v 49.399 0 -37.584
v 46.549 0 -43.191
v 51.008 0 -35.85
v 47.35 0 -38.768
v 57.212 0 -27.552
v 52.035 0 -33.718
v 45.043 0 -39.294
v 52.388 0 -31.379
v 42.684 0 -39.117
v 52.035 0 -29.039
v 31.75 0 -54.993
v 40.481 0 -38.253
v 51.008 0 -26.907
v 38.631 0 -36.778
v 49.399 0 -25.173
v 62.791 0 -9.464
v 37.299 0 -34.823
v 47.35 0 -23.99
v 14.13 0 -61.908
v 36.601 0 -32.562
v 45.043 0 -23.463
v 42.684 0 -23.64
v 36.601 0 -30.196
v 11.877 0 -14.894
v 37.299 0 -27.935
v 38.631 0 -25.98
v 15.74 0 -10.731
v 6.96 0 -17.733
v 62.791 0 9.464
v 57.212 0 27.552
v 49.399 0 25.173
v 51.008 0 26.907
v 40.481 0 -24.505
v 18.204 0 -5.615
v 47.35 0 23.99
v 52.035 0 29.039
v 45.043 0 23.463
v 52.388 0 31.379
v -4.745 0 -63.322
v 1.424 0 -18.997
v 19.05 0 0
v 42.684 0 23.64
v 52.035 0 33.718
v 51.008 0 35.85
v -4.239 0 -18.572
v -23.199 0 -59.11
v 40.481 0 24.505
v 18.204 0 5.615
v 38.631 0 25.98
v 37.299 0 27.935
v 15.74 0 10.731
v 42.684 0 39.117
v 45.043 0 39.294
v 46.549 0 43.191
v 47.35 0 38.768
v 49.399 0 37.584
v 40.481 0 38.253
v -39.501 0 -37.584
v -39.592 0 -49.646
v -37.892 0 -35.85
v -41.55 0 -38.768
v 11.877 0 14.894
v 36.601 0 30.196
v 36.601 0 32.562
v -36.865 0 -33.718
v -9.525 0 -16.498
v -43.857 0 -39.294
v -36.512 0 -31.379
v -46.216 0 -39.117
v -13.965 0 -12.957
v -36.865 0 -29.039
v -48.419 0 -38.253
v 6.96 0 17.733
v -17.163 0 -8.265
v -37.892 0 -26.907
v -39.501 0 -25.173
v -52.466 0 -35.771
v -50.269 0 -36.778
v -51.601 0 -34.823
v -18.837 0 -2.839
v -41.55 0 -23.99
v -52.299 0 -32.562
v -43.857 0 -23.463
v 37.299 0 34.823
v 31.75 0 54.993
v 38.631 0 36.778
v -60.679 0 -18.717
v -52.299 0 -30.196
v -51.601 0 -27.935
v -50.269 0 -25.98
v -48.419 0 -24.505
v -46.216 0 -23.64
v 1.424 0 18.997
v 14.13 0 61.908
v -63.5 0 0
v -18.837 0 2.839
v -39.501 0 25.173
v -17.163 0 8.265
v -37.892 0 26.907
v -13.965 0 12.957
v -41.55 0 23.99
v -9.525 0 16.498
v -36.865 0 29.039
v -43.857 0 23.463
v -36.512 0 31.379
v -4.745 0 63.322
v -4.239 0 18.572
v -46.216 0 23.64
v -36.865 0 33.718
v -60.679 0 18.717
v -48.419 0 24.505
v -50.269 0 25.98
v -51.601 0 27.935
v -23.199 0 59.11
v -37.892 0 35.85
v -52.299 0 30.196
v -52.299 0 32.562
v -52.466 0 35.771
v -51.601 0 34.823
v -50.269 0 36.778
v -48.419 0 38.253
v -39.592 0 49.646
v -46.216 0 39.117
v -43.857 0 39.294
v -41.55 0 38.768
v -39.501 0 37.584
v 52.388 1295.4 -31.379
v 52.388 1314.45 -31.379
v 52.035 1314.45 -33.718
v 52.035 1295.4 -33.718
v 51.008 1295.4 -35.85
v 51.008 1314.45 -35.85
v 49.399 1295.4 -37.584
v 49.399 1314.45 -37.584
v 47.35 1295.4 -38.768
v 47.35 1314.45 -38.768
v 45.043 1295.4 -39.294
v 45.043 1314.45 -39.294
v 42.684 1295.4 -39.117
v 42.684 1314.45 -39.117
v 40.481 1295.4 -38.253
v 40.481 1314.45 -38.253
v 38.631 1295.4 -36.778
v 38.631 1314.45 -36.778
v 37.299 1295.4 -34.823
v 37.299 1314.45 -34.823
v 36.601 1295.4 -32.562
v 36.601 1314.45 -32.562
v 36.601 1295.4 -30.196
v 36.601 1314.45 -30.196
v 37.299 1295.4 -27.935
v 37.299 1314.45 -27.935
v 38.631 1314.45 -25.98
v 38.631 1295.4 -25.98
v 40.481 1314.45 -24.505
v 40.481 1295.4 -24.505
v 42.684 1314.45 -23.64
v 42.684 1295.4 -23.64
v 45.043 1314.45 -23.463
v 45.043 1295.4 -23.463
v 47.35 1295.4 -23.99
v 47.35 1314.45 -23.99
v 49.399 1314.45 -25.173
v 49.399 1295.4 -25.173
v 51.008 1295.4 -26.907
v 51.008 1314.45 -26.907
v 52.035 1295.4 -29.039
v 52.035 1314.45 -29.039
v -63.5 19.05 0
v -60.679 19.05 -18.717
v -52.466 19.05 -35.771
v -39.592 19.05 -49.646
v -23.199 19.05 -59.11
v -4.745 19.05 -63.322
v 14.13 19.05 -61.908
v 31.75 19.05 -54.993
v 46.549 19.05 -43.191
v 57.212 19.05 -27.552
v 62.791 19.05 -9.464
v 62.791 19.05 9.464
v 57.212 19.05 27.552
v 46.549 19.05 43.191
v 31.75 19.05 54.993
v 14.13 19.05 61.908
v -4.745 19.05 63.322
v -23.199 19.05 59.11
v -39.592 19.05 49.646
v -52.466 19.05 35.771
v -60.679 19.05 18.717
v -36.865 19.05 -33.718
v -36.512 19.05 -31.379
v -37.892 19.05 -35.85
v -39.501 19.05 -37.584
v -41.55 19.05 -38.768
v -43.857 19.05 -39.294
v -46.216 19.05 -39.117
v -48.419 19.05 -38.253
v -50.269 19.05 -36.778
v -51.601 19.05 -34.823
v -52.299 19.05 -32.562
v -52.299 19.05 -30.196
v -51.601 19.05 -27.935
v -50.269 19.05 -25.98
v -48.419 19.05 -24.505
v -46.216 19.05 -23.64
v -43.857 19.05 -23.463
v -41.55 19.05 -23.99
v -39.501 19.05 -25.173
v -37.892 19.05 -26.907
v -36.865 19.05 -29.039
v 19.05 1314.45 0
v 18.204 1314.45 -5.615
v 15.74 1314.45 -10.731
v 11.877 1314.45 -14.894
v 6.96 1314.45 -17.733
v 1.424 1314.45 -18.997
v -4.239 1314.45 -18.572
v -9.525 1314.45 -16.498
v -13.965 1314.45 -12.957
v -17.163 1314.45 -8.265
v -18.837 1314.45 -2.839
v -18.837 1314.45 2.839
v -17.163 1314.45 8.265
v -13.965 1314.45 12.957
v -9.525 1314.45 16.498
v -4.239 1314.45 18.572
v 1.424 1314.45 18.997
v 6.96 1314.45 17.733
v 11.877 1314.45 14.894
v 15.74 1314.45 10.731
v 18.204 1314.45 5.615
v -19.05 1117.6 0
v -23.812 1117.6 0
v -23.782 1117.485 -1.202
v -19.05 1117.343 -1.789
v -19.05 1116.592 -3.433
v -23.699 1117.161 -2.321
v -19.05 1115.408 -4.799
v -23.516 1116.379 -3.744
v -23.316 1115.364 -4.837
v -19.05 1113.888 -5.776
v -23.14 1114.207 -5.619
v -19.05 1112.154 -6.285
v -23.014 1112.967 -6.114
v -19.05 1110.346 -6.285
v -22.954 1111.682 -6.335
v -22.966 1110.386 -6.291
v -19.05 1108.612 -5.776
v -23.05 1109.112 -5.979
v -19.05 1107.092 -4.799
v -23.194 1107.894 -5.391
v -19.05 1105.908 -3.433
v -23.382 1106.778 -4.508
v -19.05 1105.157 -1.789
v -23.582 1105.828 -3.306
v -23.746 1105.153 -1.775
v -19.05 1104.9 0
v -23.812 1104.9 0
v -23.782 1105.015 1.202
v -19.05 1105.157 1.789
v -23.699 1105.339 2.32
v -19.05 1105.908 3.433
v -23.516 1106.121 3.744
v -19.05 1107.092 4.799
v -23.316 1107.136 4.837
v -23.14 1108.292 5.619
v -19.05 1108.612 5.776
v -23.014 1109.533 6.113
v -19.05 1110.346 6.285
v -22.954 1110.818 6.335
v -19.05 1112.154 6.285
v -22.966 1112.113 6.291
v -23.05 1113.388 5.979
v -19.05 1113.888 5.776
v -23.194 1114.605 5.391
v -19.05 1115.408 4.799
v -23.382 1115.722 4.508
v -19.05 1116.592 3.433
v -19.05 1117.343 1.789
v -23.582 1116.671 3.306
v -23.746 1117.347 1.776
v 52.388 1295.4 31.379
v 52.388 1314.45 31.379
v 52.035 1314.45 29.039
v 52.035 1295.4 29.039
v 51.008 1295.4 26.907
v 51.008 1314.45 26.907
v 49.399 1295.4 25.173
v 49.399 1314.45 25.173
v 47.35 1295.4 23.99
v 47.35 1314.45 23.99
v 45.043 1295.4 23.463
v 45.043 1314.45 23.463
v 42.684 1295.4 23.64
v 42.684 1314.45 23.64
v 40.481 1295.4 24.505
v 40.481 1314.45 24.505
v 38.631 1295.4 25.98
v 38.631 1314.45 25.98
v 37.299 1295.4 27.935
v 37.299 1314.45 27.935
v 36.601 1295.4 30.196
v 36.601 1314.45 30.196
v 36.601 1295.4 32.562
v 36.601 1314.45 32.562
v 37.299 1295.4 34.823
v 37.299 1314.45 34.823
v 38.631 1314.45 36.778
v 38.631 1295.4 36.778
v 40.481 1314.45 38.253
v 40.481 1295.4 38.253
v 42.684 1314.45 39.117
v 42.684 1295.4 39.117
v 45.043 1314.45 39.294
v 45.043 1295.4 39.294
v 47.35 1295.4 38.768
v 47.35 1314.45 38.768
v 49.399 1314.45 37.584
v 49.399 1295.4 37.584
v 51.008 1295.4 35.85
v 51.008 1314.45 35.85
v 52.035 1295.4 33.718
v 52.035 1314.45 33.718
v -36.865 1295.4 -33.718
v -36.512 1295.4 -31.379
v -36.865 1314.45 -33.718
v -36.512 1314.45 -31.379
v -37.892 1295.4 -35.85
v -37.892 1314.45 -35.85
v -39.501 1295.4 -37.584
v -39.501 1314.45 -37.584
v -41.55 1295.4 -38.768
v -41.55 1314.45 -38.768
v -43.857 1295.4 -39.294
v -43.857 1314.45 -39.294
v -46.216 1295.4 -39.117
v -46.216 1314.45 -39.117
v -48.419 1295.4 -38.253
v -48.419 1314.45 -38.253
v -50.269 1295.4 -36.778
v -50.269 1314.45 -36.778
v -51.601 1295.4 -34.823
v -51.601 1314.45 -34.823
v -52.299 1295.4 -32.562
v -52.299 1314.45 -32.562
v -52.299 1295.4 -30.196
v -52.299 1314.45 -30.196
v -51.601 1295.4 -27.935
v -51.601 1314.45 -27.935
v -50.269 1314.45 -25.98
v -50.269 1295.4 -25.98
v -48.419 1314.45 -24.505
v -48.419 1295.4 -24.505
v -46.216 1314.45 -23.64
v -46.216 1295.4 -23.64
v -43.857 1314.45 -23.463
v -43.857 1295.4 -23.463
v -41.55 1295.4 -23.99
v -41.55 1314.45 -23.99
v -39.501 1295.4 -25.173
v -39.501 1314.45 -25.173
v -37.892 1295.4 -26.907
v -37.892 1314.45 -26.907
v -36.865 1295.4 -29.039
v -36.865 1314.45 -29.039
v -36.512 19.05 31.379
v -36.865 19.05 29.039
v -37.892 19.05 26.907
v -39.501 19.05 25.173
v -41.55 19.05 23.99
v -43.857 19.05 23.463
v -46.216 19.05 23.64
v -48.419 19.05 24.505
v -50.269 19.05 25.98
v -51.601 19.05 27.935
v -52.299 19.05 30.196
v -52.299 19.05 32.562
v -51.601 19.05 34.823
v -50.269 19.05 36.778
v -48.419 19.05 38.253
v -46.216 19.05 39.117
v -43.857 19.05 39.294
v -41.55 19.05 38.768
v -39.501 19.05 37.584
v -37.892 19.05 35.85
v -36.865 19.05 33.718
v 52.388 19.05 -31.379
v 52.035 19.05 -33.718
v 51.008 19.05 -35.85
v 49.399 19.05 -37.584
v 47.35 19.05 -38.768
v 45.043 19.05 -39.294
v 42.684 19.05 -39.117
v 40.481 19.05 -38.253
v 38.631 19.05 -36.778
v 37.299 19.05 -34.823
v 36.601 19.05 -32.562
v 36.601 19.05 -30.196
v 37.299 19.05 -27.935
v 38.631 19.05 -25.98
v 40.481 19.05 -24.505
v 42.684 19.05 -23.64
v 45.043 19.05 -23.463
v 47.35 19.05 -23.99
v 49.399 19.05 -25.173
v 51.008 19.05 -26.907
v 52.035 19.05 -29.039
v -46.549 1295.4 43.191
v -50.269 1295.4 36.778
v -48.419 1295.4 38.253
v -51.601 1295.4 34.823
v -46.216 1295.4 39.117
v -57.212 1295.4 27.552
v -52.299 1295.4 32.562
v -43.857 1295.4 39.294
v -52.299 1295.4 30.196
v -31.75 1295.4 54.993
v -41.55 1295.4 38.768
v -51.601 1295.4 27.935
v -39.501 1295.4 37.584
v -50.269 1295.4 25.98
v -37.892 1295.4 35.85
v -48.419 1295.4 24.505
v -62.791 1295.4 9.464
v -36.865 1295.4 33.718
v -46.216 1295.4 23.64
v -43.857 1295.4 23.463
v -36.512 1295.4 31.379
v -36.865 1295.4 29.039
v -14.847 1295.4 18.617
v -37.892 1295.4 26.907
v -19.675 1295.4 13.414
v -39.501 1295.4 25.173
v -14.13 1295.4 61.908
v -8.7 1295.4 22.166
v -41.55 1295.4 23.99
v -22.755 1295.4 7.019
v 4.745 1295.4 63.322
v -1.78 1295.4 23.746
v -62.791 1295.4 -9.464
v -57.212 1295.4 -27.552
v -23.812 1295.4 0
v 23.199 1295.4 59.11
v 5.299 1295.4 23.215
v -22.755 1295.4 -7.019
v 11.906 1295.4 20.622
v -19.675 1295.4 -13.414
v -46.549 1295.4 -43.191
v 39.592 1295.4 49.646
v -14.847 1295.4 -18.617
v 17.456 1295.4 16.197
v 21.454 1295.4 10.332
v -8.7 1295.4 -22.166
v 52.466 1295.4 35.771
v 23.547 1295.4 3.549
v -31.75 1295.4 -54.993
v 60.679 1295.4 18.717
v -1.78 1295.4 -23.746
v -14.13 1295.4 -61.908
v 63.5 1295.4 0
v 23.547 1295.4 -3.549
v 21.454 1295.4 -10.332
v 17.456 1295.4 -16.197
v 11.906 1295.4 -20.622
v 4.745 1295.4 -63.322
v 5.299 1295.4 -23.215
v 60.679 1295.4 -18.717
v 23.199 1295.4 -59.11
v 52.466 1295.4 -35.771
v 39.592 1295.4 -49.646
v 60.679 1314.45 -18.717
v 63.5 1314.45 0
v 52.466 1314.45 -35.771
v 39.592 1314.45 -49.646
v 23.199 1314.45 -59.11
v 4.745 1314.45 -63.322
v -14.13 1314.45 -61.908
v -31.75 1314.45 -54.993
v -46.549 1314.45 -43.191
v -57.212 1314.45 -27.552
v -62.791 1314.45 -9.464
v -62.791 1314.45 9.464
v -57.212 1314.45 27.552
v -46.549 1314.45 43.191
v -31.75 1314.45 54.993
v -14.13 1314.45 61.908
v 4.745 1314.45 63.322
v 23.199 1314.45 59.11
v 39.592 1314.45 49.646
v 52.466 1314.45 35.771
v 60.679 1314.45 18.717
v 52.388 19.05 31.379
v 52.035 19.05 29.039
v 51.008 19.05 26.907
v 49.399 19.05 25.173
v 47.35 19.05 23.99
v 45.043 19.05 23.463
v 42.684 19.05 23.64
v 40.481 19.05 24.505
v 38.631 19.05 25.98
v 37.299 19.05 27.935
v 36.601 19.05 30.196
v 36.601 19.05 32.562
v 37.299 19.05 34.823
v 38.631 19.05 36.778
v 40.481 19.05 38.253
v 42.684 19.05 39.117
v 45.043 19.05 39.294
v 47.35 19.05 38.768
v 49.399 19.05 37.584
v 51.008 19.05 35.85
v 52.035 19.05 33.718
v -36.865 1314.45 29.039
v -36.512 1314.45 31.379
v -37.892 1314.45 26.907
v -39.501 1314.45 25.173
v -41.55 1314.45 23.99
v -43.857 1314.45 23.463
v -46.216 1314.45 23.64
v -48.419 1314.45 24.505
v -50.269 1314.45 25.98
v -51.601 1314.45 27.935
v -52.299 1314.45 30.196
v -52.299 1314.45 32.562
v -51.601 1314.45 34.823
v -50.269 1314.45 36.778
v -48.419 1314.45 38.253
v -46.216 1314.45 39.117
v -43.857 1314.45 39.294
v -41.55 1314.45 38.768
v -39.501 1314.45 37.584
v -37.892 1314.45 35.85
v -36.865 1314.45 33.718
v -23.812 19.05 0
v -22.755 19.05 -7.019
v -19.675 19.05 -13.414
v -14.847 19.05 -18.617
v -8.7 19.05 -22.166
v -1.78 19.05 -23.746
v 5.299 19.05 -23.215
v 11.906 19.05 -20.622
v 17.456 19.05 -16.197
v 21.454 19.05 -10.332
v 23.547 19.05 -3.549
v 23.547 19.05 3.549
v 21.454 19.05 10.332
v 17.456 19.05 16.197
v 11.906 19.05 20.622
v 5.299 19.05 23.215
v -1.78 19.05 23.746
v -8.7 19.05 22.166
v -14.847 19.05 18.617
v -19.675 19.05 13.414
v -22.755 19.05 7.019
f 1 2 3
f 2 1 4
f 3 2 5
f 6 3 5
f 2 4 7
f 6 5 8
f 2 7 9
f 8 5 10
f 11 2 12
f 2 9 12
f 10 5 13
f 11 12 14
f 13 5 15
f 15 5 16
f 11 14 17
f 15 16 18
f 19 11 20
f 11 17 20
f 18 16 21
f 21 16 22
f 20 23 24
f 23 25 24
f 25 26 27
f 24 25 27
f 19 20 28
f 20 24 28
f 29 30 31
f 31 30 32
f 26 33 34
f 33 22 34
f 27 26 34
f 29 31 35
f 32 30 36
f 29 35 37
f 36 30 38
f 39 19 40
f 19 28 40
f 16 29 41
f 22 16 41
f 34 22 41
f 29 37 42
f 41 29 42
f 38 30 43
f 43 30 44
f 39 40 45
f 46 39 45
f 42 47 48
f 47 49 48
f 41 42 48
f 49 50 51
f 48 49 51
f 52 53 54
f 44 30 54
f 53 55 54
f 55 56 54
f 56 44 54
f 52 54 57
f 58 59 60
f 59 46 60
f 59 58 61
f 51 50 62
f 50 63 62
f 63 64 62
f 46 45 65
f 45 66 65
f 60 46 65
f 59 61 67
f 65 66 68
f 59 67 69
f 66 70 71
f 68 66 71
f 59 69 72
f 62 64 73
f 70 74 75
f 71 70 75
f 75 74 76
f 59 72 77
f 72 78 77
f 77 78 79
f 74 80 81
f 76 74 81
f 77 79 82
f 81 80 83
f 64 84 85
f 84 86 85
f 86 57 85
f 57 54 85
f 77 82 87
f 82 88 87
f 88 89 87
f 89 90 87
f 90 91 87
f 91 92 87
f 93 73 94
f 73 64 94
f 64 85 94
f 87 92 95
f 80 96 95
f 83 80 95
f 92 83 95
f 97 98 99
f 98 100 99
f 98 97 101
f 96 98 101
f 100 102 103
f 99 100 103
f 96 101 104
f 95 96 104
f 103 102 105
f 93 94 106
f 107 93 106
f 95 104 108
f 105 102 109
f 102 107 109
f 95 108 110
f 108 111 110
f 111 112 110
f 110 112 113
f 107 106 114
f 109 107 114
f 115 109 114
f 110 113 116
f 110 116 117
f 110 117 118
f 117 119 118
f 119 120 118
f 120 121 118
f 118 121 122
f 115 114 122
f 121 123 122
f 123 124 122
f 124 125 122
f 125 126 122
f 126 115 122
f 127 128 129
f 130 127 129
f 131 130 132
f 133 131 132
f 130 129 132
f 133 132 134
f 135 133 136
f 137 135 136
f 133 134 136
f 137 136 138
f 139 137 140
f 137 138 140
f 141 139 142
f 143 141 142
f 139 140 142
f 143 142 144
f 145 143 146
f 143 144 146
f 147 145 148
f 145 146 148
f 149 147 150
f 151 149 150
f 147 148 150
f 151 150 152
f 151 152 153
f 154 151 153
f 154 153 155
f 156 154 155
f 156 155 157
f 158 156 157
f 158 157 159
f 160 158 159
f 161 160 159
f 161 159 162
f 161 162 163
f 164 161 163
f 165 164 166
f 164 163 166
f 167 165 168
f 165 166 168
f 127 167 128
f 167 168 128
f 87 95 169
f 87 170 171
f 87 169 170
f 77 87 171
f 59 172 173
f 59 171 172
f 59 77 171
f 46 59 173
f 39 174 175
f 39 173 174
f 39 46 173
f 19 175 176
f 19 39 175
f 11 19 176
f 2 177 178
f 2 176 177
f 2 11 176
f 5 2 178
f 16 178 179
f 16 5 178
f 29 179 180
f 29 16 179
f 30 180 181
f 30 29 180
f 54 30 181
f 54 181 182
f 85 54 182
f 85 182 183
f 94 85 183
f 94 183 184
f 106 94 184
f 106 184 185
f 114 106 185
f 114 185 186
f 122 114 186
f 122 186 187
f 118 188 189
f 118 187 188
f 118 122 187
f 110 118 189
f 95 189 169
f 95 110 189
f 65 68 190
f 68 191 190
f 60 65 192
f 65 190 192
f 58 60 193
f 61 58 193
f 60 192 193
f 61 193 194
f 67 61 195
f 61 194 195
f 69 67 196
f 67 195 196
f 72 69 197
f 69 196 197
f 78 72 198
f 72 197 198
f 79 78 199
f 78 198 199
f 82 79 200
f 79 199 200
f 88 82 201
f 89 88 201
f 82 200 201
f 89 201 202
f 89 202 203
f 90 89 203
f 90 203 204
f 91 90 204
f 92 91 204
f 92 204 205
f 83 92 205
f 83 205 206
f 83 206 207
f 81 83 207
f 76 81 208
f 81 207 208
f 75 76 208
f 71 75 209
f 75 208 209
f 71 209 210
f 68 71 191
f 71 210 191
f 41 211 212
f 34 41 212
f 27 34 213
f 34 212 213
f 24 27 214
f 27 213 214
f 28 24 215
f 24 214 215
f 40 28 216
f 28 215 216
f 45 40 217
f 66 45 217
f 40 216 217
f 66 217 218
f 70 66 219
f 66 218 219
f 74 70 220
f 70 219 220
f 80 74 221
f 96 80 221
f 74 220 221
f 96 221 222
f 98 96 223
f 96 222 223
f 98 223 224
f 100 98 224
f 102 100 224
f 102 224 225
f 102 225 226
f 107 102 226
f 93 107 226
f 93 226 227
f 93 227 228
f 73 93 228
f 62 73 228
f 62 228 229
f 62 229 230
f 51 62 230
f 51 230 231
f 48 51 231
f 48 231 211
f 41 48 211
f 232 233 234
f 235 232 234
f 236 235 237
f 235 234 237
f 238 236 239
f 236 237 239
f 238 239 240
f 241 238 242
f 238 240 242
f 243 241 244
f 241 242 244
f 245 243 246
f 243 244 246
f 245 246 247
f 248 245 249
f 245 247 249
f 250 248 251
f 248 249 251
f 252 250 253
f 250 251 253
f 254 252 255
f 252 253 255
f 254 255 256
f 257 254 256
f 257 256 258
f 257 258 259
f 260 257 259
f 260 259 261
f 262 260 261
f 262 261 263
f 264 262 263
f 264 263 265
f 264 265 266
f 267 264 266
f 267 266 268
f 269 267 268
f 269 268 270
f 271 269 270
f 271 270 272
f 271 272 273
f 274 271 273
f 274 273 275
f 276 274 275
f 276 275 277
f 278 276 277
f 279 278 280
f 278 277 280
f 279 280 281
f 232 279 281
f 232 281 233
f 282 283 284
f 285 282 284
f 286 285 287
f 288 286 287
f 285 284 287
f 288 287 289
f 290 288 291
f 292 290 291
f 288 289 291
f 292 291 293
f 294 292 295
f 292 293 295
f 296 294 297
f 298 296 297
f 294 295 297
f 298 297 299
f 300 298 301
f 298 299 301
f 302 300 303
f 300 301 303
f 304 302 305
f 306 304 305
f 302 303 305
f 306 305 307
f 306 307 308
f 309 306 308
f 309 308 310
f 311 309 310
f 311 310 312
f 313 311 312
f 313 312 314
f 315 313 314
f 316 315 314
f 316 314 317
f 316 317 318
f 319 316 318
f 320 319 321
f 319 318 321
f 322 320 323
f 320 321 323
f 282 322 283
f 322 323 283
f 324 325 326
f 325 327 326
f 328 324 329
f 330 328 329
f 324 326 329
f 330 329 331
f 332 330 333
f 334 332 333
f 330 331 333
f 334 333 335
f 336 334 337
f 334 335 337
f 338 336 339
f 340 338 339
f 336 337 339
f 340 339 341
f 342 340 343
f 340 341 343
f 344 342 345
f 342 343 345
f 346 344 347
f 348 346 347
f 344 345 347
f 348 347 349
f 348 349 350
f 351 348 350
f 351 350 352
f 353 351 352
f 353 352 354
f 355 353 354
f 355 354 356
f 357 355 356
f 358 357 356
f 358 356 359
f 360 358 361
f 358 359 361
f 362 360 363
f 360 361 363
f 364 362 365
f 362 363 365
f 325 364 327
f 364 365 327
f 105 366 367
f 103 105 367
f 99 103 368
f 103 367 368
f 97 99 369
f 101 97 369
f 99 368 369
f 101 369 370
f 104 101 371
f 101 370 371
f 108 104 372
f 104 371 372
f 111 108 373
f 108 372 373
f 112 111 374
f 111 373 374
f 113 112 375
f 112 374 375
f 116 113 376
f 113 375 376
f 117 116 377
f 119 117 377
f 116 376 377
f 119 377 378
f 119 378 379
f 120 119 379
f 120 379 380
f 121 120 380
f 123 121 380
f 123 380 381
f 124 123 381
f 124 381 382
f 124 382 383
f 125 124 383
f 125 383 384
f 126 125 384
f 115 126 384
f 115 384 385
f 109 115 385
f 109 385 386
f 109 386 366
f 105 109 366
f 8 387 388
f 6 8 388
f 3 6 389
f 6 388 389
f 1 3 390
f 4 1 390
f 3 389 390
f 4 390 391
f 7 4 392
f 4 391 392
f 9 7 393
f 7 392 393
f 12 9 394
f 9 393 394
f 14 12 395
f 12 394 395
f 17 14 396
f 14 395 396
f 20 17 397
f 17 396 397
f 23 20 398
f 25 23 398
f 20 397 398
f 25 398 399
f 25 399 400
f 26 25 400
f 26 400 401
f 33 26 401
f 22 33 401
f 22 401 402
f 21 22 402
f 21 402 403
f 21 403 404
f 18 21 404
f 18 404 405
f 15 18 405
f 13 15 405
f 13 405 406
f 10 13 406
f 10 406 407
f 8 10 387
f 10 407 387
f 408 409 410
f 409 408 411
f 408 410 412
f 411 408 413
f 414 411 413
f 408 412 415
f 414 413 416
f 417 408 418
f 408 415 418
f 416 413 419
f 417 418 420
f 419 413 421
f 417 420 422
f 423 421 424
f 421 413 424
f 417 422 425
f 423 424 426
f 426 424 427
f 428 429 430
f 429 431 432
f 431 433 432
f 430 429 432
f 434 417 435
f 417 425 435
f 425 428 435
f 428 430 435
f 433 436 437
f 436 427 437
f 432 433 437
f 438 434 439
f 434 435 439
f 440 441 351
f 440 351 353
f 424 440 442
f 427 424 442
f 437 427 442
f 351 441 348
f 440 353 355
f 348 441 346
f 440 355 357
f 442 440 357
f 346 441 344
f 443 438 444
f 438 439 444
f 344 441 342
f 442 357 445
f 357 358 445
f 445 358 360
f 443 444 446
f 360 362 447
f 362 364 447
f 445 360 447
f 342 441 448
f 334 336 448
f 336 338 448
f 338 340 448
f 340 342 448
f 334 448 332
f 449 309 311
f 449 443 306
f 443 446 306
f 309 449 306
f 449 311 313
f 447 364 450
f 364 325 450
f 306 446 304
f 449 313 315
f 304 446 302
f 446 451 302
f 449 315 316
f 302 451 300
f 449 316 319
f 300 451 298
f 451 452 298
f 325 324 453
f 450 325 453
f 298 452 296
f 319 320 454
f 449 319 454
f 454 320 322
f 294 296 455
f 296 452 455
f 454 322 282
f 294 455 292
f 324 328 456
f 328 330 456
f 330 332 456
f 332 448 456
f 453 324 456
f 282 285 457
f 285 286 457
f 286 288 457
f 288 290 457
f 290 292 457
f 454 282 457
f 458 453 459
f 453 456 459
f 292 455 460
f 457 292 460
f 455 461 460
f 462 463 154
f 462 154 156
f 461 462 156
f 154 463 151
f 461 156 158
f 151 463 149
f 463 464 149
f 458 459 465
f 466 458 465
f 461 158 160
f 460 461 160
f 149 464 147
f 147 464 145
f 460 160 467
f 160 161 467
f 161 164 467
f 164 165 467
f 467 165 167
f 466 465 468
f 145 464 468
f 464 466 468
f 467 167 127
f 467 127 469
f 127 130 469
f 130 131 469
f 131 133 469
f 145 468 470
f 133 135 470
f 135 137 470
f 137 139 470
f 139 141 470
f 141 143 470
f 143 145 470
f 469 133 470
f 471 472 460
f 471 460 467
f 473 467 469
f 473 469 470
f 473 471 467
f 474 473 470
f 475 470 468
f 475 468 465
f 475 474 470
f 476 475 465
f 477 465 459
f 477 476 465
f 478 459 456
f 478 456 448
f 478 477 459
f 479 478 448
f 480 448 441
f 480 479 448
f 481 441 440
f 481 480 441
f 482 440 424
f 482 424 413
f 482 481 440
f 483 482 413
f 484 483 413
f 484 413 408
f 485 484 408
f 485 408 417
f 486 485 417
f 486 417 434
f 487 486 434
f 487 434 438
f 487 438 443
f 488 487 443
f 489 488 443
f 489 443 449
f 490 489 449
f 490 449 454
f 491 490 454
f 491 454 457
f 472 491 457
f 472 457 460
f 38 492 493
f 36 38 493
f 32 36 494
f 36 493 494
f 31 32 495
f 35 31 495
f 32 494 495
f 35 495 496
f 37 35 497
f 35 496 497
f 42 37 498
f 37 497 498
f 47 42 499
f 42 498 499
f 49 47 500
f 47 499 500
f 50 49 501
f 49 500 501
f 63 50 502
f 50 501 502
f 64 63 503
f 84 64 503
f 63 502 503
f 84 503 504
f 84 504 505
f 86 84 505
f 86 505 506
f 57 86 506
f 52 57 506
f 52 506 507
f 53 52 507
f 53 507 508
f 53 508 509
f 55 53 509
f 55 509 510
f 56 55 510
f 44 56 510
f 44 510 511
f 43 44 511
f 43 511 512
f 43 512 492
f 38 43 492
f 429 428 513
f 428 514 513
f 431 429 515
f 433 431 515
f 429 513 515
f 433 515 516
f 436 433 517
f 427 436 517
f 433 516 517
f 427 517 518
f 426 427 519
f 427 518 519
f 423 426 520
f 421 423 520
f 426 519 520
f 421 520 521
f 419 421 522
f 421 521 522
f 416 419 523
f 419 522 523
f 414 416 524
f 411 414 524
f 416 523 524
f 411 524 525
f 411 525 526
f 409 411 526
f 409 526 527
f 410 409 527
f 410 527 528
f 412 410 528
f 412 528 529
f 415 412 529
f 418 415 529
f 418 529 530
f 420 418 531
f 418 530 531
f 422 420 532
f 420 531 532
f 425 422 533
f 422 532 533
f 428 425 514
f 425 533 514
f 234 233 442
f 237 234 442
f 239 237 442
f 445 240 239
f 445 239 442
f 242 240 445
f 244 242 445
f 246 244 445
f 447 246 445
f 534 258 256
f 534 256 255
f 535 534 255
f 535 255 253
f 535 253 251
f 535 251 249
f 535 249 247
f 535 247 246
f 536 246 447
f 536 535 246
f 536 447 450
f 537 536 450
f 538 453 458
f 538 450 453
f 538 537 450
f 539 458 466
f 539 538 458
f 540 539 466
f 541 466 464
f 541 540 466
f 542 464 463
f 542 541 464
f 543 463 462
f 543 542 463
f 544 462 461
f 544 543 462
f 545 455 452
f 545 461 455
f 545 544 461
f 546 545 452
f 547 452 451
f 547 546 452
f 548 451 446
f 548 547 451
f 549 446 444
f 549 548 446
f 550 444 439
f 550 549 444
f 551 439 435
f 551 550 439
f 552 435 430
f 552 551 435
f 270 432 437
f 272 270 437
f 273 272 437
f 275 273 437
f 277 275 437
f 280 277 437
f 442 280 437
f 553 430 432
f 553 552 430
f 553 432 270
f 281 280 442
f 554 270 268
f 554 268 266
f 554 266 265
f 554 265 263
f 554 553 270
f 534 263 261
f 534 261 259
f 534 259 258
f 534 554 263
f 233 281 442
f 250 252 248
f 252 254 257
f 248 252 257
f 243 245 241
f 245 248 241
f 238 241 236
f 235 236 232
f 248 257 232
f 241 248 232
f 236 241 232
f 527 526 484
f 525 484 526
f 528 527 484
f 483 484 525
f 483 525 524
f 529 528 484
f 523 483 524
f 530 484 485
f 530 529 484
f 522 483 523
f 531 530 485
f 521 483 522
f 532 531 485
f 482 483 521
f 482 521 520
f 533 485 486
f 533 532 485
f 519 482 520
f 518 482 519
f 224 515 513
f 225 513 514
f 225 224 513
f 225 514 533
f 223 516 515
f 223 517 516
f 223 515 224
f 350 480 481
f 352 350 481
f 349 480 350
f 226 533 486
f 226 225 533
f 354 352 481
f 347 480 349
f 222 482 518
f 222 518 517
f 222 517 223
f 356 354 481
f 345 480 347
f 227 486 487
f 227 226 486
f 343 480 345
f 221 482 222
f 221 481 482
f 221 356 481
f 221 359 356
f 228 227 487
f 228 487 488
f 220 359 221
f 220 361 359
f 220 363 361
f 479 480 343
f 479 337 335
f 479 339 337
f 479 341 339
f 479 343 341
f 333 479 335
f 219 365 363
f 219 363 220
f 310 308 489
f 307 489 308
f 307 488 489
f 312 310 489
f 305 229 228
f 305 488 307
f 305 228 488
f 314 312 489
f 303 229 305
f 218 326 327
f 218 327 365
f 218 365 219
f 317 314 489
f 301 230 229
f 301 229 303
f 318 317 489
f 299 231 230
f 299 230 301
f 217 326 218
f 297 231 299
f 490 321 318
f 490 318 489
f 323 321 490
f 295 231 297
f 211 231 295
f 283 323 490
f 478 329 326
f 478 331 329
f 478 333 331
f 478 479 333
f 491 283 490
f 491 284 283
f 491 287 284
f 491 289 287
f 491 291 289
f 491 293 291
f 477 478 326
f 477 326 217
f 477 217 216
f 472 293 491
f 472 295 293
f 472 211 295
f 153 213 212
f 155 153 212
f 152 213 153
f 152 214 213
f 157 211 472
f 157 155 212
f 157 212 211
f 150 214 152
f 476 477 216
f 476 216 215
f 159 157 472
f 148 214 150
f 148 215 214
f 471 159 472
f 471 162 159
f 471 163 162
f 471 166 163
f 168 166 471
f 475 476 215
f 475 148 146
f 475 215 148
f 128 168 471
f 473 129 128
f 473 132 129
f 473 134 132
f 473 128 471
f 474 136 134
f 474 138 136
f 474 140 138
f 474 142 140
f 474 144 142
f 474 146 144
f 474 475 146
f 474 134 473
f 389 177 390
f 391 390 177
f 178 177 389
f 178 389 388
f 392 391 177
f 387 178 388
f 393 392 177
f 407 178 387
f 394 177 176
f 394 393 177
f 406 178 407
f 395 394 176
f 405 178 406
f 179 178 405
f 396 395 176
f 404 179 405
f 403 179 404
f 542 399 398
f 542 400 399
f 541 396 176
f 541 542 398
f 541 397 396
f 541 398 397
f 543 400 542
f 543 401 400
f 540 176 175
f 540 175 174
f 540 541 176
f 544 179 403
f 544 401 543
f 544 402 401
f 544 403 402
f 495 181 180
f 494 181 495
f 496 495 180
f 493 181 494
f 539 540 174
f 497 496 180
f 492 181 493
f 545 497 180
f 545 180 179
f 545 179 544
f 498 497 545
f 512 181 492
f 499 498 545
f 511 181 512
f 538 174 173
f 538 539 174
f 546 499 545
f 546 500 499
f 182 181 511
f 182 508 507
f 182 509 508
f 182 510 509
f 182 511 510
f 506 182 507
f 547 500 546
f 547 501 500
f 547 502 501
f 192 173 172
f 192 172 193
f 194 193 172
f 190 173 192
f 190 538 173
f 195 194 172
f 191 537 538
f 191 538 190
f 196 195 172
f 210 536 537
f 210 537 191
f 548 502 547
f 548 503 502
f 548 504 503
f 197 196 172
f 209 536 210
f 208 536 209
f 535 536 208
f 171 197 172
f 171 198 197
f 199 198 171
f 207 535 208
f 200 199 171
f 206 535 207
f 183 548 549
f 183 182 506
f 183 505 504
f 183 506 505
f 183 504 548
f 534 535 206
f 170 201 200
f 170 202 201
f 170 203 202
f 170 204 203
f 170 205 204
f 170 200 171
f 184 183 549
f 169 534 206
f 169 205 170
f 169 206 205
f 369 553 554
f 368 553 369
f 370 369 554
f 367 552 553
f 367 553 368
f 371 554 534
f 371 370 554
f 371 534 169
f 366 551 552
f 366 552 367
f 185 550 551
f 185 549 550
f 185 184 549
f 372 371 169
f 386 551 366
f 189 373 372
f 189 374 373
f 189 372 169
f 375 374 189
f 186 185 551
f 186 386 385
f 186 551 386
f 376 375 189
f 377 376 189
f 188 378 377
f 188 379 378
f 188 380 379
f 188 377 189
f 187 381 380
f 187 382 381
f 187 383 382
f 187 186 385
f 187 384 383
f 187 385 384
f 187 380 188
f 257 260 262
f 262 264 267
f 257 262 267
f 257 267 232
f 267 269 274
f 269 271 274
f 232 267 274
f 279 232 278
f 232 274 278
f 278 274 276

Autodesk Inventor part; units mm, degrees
ref_plane "XZ Plane" through (0, 0, 0) normal (0, 1, 0) x (-1, 0, 0)
ref_plane "XY Plane" through (0, 0, 0) normal (0, 0, 1) x (1, 0, 0)
sketch "Sketch1" plane through (0, 0, 0) normal (0, 1, 0) x (-1, 0, 0)
  circle A0 centre (0, 0) radius 23.8125
  circle A1 centre (0, 0) radius 63.5
  dimension "d2" = 127
  dimension "d8" = 47.625
extrude "Extrusion1" add sketch "Sketch1" along normal blind 1314.45 contours A0
extrude "Extrusion2" add sketch "Sketch1" along normal blind 19.05
sketch "Sketch3" plane through (0, 1314.45, 0) normal (0, 1, 0) x (1, 0, 0)
  circle A0 centre (0, 0) radius 23.8125 projected
  circle A1 centre (0, 0) radius 63.5
  dimension "d5" = 127
extrude "Extrusion3" add sketch "Sketch3" against normal blind 19.05
sketch "Sketch4" plane through (0, 1314.45, 0) normal (0, 1, 0) x (1, 0, 0)
  circle A0 centre (0, 0) radius 63.5 projected
  line L0 (0, 63.5) -> (0, -63.5)
  line L1 (63.5, 0) -> (-63.5, 0)
  circle A1 centre (44.45, 31.3787) radius 7.9375
  circle A2 centre (0, 0) radius 19.05
  circle A3 centre (44.45, -31.3787) radius 7.9375
  circle A4 centre (-44.45, 31.3787) radius 7.9375
  circle A5 centre (-44.45, -31.3787) radius 7.9375
  line L2 (0, 0) -> (-44.9013, 44.9013)
  line L3 (0, 0) -> (44.9013, 44.9013)
  point P0 (-22.4506, 22.4506)
  dimension "d9" = 38.1
  dimension "d12" = 44.45
  dimension "d13" = 15.875
  dimension "d26" = 45
  dimension "d28" = 45
extrude "Extrusion4" cut sketch "Sketch4" against normal blind 1314.45 contours A2 L0 L1 | L1 L3 A2 | L3 L0 A2 | A2 L1 L0 | L2 A2 L0 | L1 A2 L2
extrude "Extrusion5" cut sketch "Sketch4" against normal blind 1314.45 contours A1 | A3 | A4 | A5
ref_plane "Work Plane1" through (-63.5, 0, 0) normal (1, 0, 0) x (0, 1, 0)
sketch "Sketch5" plane through (-63.5, 0, 0) normal (1, 0, 0) x (0, 1, 0)
  line L0 (1314.45, 19.05) -> (0, 19.05) projected
  line L1 (1111.25, 19.05) -> (1111.25, -14.2371)
  line L2 (1314.45, -63.5) -> (1314.45, 63.5) projected
  circle A0 centre (1111.25, 0) radius 6.35
  point P0 (0, 0)
  dimension "d17" = 203.2
  dimension "d18" = 12.7
extrude "Extrusion6" cut sketch "Sketch5" along normal blind 44.45
thread "Thread1" size "1/2-13 UNC" class "2B" standard "ANSI Unified Screw Threads" full length
ref_plane "Work Plane2" through (-23.8125, 0, 0) normal (1, 0, 0) x (0, 1, 0)
sketch "Sketch6" plane through (-63.5, 0, 0) normal (1, 0, 0) x (0, 1, 0)
  line L0 (4.6815, -69.7945) -> (23.2887, -69.7945)
  line L1 (23.2887, -69.7945) -> (1344.0887, -69.7945)
  line L2 (683.6887, -69.7945) -> (683.6887, -90.3747)
  line L3 (683.6887, -69.7945) -> (683.6887, -37.5296)
  line L4 (683.6887, -69.7945) -> (715.9537, -69.7945) construction
  point P0 (0, 0)
  dimension "d23" = 1320.8
  dimension "d24" = 90
ref_plane "Work Plane3" through (0, 1314.45, 0) normal (0.7071, 0, -0.7071) x (-0.7071, 0, -0.7071)
ref_plane "Work Plane4" through (0, 1314.45, 0) normal (-0.7071, 0, -0.7071) x (0.7071, 0, -0.7071)
properties part number "New Metal Pipe"
